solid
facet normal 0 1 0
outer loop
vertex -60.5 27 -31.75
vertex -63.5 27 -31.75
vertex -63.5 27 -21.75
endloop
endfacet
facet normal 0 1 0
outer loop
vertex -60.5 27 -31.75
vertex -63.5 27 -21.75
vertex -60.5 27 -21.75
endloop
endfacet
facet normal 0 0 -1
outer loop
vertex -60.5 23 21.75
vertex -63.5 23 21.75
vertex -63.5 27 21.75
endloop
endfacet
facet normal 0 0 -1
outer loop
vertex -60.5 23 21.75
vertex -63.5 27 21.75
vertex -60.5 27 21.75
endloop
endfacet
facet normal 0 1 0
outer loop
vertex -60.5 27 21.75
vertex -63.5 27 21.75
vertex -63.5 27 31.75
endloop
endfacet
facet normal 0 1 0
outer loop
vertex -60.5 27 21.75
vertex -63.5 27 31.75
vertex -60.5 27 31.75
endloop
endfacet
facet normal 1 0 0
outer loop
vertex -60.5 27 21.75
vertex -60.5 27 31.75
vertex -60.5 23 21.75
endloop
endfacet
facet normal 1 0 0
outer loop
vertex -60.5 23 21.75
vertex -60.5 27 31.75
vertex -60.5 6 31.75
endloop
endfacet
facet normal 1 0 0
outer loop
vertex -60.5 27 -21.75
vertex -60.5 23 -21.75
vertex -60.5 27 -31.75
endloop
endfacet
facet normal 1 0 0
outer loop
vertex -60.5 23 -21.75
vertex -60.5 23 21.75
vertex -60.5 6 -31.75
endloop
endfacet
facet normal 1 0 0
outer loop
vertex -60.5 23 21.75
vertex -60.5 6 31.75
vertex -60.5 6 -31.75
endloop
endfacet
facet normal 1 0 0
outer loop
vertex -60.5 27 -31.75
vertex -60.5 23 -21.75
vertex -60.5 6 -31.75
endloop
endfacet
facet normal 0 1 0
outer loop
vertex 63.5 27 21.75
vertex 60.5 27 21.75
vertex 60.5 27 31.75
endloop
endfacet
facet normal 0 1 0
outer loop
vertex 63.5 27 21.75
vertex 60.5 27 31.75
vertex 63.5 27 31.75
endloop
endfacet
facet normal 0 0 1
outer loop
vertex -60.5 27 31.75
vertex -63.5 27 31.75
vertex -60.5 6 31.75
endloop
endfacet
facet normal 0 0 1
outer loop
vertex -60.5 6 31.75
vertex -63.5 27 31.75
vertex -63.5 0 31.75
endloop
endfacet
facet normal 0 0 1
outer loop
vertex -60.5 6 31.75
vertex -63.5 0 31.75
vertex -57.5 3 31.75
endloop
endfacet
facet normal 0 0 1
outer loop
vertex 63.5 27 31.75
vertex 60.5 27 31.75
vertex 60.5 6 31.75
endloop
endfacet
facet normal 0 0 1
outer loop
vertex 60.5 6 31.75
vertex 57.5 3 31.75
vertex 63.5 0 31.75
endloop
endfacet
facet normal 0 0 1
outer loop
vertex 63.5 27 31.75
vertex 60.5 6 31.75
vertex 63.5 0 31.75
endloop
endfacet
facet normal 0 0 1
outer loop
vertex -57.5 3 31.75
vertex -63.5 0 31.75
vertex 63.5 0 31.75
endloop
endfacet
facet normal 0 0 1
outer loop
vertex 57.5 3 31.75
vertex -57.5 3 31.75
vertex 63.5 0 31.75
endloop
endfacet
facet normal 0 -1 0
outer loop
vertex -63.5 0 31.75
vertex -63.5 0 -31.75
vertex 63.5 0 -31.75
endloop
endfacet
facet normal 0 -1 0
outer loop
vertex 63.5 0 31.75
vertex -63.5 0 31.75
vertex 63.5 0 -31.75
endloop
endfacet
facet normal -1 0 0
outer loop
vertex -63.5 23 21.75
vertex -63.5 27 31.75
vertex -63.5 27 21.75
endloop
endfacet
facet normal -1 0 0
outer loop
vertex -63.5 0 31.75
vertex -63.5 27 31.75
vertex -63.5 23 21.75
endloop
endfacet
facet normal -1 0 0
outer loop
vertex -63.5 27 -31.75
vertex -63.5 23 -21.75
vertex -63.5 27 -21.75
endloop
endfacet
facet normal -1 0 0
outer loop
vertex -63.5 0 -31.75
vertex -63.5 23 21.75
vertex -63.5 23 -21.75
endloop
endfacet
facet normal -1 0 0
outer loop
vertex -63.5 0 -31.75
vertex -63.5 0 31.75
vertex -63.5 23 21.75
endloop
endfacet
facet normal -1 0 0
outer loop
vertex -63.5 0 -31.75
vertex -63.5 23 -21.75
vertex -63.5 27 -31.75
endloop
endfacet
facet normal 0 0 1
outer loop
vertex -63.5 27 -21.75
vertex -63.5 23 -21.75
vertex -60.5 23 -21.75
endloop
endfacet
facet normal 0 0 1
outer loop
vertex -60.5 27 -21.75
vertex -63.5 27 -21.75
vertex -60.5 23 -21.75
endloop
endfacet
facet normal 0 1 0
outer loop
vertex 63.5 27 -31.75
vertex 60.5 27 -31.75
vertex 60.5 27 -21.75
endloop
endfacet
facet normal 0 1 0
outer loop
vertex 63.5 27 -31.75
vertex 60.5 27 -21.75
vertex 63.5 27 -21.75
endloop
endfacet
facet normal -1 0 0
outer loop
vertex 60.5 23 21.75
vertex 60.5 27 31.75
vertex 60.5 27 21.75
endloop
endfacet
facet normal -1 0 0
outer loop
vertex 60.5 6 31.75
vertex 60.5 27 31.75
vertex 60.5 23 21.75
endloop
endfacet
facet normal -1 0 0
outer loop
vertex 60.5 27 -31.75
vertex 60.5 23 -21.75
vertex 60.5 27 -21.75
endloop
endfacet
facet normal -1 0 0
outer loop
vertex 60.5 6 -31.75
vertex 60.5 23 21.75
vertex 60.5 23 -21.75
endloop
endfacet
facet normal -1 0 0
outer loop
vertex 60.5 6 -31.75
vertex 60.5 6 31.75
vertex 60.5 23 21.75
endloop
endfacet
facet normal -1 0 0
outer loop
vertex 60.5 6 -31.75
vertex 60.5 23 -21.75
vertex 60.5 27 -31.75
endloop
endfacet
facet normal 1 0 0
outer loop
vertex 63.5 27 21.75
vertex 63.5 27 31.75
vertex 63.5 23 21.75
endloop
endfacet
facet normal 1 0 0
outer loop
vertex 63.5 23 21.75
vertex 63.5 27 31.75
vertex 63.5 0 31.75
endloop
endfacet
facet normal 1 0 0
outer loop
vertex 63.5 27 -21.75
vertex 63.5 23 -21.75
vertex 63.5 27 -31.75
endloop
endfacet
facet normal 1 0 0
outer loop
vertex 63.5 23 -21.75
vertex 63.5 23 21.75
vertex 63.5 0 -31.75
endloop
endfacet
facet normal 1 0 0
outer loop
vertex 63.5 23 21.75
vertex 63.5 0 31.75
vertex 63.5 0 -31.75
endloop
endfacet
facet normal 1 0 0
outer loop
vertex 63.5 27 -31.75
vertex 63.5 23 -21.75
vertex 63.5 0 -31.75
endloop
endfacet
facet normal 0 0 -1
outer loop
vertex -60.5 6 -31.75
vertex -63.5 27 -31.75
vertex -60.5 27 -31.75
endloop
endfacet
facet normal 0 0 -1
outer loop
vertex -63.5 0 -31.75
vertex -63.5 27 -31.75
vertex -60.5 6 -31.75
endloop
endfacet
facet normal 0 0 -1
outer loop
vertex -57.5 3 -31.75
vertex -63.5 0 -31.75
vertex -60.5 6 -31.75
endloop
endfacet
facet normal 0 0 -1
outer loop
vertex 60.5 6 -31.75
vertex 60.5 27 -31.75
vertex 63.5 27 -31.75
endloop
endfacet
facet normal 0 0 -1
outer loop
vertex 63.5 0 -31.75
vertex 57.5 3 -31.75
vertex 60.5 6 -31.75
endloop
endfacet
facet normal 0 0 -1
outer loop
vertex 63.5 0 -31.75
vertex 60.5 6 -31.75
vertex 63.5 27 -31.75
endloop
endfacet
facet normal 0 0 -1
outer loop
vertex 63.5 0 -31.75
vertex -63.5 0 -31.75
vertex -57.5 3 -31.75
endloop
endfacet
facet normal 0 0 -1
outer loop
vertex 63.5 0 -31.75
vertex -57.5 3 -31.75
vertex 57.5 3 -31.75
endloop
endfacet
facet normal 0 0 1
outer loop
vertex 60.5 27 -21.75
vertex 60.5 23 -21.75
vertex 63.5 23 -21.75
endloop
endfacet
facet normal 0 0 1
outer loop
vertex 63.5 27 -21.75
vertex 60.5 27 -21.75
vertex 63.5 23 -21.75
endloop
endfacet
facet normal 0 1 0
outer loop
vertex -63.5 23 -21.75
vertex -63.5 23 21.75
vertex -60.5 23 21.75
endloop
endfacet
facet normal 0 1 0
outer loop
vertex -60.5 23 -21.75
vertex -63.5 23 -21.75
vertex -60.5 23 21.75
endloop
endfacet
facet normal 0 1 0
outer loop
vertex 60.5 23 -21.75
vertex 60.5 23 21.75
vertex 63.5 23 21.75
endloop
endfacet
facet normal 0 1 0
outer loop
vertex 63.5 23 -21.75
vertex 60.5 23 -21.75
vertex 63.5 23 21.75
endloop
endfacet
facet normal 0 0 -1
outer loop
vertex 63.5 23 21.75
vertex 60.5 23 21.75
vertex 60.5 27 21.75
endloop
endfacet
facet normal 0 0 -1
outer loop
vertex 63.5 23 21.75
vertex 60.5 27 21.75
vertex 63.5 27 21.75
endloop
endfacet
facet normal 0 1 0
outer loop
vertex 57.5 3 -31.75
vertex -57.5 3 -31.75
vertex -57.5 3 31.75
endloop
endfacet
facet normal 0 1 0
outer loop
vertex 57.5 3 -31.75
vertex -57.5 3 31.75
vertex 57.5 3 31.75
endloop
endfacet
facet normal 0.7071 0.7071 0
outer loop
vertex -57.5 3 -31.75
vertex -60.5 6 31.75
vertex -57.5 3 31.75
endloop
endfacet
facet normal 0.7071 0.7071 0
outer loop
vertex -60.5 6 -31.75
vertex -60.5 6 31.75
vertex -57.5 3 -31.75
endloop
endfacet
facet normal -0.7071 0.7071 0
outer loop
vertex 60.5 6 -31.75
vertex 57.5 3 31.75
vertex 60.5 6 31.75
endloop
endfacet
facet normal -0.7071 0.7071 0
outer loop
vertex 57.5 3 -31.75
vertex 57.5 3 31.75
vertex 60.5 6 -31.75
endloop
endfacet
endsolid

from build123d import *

# Parameters (mm, degrees)
SKETCH1_W           = 127
SKETCH1_H           = 63.5
BOSS_EXTRUDE1_DEPTH = 3
SKETCH2_W           = 3
SKETCH2_H           = 63.5
BOSS_EXTRUDE2_DEPTH = 20
CHAMFER1_SIZE       = 3
SKETCH3_W           = 3
SKETCH3_H           = 10
BOSS_EXTRUDE3_DEPTH = 4


with BuildPart() as part:
    # Sketch1 → Boss-Extrude1 (new body)
    with BuildSketch(Plane(origin=(0, 0, 0), x_dir=(1, 0, 0), z_dir=(0, 1, 0))):
        Rectangle(SKETCH1_W, SKETCH1_H)
    extrude(amount=BOSS_EXTRUDE1_DEPTH)

    # Sketch2 → Boss-Extrude2 (add)
    with BuildSketch(Plane(origin=(0, 3, 0), x_dir=(1, 0, 0), z_dir=(0, 1, 0))):
        with Locations((-62, 0)):
            Rectangle(SKETCH2_W, SKETCH2_H)
        with Locations((62, 0)):
            Rectangle(SKETCH2_W, SKETCH2_H)
    extrude(amount=BOSS_EXTRUDE2_DEPTH)

    # Chamfer1
    chamfer1_edges = [part.edges().sort_by_distance(p)[0] for p in [
        (-60.5, 3, 0),
        (60.5, 3, 0),
    ]]
    chamfer(chamfer1_edges, length=CHAMFER1_SIZE)

    # Sketch3 → Boss-Extrude3 (add)
    with BuildSketch(Plane(origin=(0, 23, 0), x_dir=(1, 0, 0), z_dir=(0, 1, 0))):
        with Locations((-62, 26.75)):
            Rectangle(SKETCH3_W, SKETCH3_H)
        with Locations((-62, -26.75)):
            Rectangle(SKETCH3_W, SKETCH3_H)
        with Locations((62, 26.75)):
            Rectangle(SKETCH3_W, SKETCH3_H)
        with Locations((62, -26.75)):
            Rectangle(SKETCH3_W, SKETCH3_H)
    extrude(amount=BOSS_EXTRUDE3_DEPTH)


solid = part.part
